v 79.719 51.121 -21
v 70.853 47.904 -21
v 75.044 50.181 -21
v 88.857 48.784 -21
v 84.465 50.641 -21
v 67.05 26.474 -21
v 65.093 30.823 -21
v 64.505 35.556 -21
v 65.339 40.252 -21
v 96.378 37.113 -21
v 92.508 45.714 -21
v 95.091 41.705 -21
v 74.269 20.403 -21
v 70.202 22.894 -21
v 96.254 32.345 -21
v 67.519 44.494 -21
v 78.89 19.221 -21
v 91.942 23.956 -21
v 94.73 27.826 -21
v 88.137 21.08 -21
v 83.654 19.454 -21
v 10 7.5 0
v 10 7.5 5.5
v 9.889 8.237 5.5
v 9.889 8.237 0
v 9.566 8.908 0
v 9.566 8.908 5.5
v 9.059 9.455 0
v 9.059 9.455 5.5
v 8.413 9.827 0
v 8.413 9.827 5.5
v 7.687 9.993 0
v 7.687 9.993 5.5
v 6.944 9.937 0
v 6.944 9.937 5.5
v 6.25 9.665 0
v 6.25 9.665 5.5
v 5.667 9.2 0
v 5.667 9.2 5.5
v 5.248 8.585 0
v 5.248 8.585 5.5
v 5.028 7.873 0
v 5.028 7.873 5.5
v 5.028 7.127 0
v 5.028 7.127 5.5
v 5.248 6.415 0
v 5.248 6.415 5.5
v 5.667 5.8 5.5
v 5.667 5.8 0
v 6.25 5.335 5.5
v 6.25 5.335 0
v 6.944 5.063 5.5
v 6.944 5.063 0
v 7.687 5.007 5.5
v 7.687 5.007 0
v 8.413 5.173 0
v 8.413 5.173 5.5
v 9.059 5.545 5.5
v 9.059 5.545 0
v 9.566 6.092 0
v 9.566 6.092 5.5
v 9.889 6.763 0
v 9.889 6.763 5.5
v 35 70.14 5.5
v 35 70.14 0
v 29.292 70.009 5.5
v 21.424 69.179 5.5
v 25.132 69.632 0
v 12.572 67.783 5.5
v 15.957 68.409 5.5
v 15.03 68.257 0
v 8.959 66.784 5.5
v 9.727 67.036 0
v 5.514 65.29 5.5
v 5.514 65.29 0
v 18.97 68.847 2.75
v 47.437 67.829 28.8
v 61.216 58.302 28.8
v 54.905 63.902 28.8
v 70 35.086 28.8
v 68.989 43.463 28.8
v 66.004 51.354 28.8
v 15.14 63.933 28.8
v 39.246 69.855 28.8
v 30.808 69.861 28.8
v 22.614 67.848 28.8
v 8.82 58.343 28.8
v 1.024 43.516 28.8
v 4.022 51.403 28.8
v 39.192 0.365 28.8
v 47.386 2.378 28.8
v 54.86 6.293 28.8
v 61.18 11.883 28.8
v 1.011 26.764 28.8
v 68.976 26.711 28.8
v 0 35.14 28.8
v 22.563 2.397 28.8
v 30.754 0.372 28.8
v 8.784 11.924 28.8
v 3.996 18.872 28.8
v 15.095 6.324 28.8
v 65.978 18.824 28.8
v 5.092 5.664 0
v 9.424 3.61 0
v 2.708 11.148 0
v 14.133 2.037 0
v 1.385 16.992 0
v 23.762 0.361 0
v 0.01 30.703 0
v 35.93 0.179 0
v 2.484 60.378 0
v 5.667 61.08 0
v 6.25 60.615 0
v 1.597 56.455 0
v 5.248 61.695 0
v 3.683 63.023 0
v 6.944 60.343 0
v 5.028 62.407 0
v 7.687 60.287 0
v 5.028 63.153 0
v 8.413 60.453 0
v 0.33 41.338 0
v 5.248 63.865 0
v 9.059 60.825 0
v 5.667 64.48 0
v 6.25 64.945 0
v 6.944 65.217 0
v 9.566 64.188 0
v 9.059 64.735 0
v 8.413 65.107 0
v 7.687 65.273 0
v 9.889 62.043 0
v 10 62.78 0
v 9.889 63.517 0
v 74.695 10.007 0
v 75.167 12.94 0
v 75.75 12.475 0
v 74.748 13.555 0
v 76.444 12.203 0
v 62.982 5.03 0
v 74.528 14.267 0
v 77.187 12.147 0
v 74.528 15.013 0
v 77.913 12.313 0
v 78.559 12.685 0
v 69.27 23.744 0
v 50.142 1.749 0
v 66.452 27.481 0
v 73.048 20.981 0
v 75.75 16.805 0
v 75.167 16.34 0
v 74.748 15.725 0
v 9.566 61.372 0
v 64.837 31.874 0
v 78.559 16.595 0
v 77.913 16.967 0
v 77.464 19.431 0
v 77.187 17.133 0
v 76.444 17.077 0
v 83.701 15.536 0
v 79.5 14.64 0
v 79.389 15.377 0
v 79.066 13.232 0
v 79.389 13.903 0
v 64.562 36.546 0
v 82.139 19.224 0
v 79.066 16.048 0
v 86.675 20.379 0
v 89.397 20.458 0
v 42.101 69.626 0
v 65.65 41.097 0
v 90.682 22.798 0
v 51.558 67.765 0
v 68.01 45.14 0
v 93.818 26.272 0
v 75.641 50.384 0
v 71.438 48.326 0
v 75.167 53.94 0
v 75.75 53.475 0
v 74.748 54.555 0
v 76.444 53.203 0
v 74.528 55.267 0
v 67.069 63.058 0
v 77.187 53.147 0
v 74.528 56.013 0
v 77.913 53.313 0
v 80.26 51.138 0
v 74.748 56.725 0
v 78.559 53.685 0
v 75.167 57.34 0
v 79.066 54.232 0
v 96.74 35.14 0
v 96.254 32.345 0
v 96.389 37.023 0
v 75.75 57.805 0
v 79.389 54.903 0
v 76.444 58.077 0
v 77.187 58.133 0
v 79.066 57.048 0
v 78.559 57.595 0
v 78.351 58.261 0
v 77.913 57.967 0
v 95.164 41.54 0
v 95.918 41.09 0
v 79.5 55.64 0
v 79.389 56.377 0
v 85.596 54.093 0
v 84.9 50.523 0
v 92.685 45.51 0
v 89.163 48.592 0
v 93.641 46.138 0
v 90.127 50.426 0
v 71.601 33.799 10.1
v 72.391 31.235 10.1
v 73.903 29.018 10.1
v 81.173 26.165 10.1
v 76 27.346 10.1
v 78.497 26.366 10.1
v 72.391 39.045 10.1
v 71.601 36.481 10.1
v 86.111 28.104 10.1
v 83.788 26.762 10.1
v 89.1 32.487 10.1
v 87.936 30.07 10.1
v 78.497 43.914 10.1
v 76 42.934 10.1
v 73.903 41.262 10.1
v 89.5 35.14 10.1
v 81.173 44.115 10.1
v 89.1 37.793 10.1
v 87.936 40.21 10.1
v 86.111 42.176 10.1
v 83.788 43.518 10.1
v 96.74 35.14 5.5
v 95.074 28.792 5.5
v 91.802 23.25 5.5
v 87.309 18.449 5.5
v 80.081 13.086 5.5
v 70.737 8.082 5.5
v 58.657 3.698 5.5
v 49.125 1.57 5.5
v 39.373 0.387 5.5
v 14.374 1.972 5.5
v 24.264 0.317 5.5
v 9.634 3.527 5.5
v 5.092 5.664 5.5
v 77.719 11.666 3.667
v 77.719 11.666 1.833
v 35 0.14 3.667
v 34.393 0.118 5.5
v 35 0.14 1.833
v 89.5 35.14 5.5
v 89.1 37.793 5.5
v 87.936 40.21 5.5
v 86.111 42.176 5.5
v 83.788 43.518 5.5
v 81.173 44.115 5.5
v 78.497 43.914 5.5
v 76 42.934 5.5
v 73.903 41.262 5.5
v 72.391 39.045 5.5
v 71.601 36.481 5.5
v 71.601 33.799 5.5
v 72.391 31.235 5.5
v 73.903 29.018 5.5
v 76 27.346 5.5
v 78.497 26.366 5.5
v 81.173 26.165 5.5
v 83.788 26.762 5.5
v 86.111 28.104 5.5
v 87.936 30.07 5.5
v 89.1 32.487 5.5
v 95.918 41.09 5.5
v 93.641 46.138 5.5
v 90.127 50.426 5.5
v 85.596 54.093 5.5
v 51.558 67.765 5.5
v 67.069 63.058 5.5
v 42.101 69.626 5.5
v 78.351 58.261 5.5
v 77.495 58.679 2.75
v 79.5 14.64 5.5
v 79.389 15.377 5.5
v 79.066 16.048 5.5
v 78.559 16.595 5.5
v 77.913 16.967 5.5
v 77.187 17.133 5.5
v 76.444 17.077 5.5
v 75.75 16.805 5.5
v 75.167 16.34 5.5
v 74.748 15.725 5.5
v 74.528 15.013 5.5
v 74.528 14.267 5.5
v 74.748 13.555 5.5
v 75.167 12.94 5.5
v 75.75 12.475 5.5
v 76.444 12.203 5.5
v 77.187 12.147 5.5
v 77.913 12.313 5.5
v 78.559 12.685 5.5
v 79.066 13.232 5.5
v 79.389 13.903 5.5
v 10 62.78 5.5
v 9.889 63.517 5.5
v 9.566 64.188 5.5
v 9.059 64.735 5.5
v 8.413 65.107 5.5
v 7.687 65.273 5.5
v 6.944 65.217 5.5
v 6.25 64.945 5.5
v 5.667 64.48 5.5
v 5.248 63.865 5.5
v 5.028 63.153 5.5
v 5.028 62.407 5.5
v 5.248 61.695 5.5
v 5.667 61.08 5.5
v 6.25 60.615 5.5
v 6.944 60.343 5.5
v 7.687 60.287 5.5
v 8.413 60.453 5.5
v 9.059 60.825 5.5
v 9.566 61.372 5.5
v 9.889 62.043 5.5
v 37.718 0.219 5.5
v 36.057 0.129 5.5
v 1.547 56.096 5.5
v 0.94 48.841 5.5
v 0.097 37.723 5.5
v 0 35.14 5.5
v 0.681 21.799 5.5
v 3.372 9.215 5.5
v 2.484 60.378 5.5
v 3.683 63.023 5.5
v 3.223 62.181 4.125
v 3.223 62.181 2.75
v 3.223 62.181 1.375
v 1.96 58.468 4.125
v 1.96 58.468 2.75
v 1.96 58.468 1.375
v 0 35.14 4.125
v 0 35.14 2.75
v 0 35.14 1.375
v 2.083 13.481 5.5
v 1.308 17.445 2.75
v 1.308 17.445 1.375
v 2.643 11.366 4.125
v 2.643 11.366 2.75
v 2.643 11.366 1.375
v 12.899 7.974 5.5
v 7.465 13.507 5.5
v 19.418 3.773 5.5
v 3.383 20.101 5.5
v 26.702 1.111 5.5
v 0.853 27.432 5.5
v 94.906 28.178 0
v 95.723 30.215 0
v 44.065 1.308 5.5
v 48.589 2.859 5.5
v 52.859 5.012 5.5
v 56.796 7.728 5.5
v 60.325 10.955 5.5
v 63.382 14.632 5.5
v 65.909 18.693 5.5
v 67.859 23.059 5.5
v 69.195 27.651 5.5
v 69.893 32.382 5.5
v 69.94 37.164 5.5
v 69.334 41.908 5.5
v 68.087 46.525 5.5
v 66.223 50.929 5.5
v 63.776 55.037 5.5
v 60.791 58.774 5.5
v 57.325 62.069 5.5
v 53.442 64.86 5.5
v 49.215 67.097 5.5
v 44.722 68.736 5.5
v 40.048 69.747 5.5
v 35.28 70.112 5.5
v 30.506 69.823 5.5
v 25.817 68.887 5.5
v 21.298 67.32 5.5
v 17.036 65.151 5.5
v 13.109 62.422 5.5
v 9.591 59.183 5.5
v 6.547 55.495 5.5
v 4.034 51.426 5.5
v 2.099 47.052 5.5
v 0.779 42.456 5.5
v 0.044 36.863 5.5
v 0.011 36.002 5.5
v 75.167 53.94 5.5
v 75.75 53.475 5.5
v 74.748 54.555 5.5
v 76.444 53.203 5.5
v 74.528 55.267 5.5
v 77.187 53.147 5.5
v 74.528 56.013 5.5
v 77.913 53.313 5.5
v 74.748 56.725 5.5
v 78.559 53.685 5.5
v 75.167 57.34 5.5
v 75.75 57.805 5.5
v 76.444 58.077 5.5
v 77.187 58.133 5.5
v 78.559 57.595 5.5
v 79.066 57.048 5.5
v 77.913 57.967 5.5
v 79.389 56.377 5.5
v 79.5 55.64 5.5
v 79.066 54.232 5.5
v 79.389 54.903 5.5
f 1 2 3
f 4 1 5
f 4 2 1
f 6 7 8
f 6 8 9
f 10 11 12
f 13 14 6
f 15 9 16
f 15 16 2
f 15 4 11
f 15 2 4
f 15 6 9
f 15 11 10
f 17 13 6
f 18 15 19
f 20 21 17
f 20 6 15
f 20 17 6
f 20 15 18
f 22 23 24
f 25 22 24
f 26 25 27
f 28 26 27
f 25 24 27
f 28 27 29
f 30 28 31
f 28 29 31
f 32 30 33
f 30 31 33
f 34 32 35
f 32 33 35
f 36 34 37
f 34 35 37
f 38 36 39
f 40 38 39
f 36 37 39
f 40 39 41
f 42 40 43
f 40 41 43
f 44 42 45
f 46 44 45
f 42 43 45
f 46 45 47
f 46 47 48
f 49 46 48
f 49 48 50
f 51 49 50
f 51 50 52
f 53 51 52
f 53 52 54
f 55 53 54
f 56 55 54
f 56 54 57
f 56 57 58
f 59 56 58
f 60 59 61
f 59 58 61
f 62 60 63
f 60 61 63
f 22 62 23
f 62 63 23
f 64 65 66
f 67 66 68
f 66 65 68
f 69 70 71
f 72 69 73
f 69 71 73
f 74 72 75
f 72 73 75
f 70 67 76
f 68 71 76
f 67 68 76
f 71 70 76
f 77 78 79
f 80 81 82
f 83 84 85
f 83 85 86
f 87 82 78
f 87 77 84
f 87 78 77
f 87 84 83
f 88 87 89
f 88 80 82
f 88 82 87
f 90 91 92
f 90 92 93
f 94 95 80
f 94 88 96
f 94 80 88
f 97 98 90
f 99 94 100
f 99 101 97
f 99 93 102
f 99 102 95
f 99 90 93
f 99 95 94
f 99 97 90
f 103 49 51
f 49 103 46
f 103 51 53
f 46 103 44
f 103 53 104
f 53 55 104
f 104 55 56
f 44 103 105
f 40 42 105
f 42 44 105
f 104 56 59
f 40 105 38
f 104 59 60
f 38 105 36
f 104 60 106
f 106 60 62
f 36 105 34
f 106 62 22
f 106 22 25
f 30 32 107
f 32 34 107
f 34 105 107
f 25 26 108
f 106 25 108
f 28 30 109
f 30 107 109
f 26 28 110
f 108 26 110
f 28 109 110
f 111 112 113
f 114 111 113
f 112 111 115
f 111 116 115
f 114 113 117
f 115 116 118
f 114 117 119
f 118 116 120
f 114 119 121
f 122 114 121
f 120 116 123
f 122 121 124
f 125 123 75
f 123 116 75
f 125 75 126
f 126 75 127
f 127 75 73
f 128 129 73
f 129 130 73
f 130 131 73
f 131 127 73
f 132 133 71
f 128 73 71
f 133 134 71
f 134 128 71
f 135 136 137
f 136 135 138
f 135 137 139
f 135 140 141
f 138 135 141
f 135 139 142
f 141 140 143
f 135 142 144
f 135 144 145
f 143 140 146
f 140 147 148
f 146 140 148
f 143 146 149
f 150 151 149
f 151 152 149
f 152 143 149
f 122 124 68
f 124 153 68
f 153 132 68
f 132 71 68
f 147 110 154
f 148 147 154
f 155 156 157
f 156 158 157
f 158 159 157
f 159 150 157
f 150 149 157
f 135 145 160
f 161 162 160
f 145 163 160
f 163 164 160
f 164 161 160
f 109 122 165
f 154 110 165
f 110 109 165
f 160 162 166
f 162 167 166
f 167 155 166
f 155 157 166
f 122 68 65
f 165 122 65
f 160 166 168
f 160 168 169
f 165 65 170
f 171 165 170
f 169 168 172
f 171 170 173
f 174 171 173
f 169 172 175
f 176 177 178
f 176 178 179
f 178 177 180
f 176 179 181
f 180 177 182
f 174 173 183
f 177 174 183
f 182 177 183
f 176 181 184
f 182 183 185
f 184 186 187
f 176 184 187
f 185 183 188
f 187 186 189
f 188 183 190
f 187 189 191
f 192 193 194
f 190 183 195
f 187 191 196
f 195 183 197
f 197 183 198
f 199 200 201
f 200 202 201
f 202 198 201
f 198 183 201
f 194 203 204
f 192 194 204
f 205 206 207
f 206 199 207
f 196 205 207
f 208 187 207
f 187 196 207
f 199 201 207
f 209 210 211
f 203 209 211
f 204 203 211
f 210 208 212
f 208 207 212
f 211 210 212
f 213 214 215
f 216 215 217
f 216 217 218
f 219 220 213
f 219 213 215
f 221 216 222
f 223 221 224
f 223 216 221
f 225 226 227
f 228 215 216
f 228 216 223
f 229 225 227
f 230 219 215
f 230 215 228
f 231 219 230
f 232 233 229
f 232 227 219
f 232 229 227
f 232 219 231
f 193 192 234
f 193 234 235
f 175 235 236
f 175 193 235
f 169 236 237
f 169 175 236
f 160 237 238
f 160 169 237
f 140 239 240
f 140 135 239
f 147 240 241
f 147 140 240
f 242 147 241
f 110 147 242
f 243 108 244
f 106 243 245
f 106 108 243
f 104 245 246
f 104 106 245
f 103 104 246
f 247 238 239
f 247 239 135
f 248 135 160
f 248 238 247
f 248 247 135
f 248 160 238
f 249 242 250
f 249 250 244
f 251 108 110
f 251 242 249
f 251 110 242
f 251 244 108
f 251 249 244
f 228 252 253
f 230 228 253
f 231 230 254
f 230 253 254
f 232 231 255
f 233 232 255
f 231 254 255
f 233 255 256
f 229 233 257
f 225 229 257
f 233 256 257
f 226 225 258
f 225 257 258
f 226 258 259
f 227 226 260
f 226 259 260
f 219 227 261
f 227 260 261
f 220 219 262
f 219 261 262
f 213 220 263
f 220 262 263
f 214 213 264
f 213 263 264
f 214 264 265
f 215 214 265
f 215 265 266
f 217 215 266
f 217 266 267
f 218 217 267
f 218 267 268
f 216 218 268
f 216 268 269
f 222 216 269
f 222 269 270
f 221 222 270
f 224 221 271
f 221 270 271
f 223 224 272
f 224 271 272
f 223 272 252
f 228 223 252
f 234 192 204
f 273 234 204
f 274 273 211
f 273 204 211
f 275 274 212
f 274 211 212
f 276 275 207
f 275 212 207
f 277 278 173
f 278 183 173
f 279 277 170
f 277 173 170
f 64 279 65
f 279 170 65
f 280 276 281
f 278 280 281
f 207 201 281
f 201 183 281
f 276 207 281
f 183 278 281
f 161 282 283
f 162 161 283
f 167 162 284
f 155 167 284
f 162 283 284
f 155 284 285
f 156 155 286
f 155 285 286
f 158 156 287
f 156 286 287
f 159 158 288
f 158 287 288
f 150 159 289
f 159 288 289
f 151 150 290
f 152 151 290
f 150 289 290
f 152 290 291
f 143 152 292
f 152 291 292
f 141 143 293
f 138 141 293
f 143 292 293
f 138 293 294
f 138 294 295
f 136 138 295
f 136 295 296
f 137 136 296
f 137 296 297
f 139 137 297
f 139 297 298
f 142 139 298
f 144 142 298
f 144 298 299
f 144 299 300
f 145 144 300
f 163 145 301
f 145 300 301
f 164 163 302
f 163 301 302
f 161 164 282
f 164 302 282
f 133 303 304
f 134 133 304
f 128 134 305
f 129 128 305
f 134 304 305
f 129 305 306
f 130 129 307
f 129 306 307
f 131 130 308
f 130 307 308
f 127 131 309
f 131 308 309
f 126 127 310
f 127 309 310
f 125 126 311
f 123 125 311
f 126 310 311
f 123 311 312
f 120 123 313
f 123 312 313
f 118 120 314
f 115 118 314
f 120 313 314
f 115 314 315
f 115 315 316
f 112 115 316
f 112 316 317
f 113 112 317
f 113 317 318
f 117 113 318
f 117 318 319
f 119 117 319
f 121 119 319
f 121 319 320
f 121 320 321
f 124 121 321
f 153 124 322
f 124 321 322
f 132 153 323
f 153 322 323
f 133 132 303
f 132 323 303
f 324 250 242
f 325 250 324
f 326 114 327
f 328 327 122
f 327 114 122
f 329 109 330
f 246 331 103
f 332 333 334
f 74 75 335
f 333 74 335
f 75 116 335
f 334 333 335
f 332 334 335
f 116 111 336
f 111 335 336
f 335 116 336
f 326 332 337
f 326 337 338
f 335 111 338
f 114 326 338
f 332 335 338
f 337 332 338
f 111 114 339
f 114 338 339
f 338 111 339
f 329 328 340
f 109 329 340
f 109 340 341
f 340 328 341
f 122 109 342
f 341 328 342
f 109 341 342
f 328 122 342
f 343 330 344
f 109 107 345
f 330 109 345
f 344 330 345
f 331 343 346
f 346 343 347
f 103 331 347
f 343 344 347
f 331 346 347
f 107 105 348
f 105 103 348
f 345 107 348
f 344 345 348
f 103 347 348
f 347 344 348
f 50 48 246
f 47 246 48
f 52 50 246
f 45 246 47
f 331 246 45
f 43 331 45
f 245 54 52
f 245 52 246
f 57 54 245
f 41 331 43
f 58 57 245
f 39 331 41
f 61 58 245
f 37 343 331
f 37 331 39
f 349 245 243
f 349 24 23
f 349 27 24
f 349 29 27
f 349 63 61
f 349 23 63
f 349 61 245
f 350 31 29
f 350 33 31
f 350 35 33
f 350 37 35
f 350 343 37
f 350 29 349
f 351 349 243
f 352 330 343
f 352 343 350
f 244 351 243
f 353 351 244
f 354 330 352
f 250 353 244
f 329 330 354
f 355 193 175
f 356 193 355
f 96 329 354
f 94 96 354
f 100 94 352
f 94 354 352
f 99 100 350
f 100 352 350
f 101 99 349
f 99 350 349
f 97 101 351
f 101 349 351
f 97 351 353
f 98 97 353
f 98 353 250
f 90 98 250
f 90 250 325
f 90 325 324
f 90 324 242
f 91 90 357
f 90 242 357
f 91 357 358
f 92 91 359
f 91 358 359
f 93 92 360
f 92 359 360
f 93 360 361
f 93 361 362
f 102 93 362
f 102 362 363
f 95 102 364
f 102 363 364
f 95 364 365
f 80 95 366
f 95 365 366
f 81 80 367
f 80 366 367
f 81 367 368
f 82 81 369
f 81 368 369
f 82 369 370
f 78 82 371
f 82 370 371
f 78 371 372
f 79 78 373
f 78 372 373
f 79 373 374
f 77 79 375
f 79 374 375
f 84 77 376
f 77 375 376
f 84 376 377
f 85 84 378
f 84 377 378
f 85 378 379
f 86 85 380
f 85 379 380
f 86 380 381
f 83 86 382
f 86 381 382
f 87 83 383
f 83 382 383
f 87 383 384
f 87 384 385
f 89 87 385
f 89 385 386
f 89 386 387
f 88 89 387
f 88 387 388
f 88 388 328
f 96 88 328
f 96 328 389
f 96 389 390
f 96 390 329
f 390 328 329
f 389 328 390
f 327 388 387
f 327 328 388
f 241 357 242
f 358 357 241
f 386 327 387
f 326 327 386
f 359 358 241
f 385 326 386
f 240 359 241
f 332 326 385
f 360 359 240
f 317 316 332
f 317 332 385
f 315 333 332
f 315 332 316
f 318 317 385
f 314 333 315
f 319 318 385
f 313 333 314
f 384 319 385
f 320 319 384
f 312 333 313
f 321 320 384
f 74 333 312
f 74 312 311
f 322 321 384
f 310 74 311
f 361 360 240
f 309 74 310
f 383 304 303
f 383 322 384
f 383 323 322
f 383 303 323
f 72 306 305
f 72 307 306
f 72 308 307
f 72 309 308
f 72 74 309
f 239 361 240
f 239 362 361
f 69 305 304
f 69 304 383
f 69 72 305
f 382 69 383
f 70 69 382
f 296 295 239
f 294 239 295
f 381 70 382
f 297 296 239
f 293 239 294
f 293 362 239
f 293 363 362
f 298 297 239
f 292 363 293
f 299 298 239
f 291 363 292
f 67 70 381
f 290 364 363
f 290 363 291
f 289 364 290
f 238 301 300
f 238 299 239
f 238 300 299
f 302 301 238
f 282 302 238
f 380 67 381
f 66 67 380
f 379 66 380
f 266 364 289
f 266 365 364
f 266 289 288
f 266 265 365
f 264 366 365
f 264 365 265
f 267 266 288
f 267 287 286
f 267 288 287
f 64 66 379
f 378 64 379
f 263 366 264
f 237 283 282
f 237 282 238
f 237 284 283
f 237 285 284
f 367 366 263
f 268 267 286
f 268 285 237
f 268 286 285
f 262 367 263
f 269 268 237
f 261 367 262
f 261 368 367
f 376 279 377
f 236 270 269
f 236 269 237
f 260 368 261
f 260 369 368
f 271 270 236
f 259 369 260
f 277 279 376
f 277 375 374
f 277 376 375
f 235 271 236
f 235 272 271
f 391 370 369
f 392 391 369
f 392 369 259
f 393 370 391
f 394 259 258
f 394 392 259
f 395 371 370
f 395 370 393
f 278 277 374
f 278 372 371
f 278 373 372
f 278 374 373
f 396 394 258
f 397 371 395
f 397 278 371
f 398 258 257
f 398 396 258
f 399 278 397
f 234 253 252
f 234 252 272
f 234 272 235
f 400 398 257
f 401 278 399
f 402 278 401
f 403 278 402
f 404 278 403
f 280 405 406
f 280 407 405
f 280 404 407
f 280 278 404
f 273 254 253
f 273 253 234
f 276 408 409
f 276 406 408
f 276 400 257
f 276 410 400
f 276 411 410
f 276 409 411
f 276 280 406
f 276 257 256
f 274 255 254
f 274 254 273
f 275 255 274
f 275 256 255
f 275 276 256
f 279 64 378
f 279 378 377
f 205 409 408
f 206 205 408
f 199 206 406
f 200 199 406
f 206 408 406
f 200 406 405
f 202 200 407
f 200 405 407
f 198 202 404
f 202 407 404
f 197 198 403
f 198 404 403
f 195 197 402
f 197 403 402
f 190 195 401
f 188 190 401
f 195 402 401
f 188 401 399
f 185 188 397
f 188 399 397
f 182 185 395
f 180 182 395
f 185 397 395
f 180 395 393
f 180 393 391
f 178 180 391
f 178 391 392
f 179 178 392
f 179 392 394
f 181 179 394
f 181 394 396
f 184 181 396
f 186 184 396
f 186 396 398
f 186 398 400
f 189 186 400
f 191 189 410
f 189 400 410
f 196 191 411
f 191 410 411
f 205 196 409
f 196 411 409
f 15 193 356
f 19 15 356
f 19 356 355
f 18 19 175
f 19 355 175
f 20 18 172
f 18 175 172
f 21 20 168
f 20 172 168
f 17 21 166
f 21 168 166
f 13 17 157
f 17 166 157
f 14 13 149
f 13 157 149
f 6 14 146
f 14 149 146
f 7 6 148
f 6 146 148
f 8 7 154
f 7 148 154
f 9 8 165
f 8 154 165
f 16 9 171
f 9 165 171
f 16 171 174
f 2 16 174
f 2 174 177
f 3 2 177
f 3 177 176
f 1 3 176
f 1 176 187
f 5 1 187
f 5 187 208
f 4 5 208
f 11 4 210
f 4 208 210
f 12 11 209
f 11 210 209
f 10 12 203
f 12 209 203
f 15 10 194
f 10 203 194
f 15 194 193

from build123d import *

# Parameters (mm, degrees)
BOSS_EXTRU_1_DEPTH      = 5.5
ESQUISSE3_R             = 2.5
ENL_V_MAT_EXTRU_1_DEPTH = 5.5
ESQUISSE4_R             = 9
BOSS_EXTRU_3_DEPTH      = 4.6
ESQUISSE2_R             = 35
BOSS_EXTRU_2_DEPTH      = 23.3
ESQUISSE5_R             = 16
BOSS_EXTRU_4_DEPTH      = 21


with BuildPart() as part:
    # Esquisse1 → Boss.-Extru.1 (new body)
    with BuildSketch(Plane.XY):
        with BuildLine():
            add(Edge.make_bspline(
                [(96.74, 35.14), (96.700966604, 46.914828886), (76.669243873, 62.532909125), (43.186721807, 70.453815297), (35, 70.14)],
                knots=[0, 0, 0, 0, 0.420118968, 1, 1, 1, 1], degree=3))
            add(Edge.make_bspline(
                [(35, 70.14), (29.89922146, 70.296066514), (19.629650744, 68.989823621), (9.641451794, 67.514202382), (5.51358225, 65.29011499)],
                knots=[0, 0, 0, 0, 0.536066819, 1, 1, 1, 1], degree=3))
            add(Edge.make_bspline(
                [(5.51358225, 65.29011499), (1.61130463, 61.662907457), (1.250702971, 49.999272028), (-0.535437112, 34.426866806), (0.654932347, 19.165653112), (2.922501297, 9.271234675), (5.092204, 5.66435325)],
                knots=[0, 0, 0, 0, 0.25720549, 0.505904817, 0.797009019, 1, 1, 1, 1], degree=3))
            add(Edge.make_bspline(
                [(96.74, 35.14), (95.57744451, 24.437841166), (74.678338114, 6.386866594), (40.041164519, -1.581693557), (14.123677955, 0.659923037), (5.092204, 5.66435325)],
                knots=[0, 0, 0, 0, 0.293375681, 0.712147859, 1, 1, 1, 1], degree=3))
        make_face()
    extrude(amount=BOSS_EXTRU_1_DEPTH)

    # Esquisse3 → Enlèv. mat.-Extru.1 (cut)
    with BuildSketch(Plane.XY.offset(5.5)):
        with Locations((7.5, 62.78)):
            Circle(ESQUISSE3_R)
        with Locations((7.5, 7.5)):
            Circle(ESQUISSE3_R)
        with Locations((77, 14.64)):
            Circle(ESQUISSE3_R)
        with Locations((77, 55.64)):
            Circle(ESQUISSE3_R)
    extrude(amount=-ENL_V_MAT_EXTRU_1_DEPTH, mode=Mode.SUBTRACT)

    # Esquisse4 → Boss.-Extru.3 (add)
    with BuildSketch(Plane.XY.offset(5.5)):
        with Locations((80.5, 35.14)):
            Circle(ESQUISSE4_R)
    extrude(amount=BOSS_EXTRU_3_DEPTH)

    # Esquisse2 → Boss.-Extru.2 (add)
    with BuildSketch(Plane.XY.offset(5.5)):
        with Locations(Location((35, 35.113142172, 0), (0, 0, 179.955291193))):
            Circle(ESQUISSE2_R)
    extrude(amount=BOSS_EXTRU_2_DEPTH)

    # Esquisse5 → Boss.-Extru.4 (add)
    with BuildSketch(Plane(origin=(0, 0, 0), x_dir=(-1, 0, 0), z_dir=(0, 0, -1))):
        with Locations(Location((-80.5, 35.14, 0), (0, 0, 190.060871127))):
            Circle(ESQUISSE5_R)
    extrude(amount=BOSS_EXTRU_4_DEPTH)


solid = part.part
